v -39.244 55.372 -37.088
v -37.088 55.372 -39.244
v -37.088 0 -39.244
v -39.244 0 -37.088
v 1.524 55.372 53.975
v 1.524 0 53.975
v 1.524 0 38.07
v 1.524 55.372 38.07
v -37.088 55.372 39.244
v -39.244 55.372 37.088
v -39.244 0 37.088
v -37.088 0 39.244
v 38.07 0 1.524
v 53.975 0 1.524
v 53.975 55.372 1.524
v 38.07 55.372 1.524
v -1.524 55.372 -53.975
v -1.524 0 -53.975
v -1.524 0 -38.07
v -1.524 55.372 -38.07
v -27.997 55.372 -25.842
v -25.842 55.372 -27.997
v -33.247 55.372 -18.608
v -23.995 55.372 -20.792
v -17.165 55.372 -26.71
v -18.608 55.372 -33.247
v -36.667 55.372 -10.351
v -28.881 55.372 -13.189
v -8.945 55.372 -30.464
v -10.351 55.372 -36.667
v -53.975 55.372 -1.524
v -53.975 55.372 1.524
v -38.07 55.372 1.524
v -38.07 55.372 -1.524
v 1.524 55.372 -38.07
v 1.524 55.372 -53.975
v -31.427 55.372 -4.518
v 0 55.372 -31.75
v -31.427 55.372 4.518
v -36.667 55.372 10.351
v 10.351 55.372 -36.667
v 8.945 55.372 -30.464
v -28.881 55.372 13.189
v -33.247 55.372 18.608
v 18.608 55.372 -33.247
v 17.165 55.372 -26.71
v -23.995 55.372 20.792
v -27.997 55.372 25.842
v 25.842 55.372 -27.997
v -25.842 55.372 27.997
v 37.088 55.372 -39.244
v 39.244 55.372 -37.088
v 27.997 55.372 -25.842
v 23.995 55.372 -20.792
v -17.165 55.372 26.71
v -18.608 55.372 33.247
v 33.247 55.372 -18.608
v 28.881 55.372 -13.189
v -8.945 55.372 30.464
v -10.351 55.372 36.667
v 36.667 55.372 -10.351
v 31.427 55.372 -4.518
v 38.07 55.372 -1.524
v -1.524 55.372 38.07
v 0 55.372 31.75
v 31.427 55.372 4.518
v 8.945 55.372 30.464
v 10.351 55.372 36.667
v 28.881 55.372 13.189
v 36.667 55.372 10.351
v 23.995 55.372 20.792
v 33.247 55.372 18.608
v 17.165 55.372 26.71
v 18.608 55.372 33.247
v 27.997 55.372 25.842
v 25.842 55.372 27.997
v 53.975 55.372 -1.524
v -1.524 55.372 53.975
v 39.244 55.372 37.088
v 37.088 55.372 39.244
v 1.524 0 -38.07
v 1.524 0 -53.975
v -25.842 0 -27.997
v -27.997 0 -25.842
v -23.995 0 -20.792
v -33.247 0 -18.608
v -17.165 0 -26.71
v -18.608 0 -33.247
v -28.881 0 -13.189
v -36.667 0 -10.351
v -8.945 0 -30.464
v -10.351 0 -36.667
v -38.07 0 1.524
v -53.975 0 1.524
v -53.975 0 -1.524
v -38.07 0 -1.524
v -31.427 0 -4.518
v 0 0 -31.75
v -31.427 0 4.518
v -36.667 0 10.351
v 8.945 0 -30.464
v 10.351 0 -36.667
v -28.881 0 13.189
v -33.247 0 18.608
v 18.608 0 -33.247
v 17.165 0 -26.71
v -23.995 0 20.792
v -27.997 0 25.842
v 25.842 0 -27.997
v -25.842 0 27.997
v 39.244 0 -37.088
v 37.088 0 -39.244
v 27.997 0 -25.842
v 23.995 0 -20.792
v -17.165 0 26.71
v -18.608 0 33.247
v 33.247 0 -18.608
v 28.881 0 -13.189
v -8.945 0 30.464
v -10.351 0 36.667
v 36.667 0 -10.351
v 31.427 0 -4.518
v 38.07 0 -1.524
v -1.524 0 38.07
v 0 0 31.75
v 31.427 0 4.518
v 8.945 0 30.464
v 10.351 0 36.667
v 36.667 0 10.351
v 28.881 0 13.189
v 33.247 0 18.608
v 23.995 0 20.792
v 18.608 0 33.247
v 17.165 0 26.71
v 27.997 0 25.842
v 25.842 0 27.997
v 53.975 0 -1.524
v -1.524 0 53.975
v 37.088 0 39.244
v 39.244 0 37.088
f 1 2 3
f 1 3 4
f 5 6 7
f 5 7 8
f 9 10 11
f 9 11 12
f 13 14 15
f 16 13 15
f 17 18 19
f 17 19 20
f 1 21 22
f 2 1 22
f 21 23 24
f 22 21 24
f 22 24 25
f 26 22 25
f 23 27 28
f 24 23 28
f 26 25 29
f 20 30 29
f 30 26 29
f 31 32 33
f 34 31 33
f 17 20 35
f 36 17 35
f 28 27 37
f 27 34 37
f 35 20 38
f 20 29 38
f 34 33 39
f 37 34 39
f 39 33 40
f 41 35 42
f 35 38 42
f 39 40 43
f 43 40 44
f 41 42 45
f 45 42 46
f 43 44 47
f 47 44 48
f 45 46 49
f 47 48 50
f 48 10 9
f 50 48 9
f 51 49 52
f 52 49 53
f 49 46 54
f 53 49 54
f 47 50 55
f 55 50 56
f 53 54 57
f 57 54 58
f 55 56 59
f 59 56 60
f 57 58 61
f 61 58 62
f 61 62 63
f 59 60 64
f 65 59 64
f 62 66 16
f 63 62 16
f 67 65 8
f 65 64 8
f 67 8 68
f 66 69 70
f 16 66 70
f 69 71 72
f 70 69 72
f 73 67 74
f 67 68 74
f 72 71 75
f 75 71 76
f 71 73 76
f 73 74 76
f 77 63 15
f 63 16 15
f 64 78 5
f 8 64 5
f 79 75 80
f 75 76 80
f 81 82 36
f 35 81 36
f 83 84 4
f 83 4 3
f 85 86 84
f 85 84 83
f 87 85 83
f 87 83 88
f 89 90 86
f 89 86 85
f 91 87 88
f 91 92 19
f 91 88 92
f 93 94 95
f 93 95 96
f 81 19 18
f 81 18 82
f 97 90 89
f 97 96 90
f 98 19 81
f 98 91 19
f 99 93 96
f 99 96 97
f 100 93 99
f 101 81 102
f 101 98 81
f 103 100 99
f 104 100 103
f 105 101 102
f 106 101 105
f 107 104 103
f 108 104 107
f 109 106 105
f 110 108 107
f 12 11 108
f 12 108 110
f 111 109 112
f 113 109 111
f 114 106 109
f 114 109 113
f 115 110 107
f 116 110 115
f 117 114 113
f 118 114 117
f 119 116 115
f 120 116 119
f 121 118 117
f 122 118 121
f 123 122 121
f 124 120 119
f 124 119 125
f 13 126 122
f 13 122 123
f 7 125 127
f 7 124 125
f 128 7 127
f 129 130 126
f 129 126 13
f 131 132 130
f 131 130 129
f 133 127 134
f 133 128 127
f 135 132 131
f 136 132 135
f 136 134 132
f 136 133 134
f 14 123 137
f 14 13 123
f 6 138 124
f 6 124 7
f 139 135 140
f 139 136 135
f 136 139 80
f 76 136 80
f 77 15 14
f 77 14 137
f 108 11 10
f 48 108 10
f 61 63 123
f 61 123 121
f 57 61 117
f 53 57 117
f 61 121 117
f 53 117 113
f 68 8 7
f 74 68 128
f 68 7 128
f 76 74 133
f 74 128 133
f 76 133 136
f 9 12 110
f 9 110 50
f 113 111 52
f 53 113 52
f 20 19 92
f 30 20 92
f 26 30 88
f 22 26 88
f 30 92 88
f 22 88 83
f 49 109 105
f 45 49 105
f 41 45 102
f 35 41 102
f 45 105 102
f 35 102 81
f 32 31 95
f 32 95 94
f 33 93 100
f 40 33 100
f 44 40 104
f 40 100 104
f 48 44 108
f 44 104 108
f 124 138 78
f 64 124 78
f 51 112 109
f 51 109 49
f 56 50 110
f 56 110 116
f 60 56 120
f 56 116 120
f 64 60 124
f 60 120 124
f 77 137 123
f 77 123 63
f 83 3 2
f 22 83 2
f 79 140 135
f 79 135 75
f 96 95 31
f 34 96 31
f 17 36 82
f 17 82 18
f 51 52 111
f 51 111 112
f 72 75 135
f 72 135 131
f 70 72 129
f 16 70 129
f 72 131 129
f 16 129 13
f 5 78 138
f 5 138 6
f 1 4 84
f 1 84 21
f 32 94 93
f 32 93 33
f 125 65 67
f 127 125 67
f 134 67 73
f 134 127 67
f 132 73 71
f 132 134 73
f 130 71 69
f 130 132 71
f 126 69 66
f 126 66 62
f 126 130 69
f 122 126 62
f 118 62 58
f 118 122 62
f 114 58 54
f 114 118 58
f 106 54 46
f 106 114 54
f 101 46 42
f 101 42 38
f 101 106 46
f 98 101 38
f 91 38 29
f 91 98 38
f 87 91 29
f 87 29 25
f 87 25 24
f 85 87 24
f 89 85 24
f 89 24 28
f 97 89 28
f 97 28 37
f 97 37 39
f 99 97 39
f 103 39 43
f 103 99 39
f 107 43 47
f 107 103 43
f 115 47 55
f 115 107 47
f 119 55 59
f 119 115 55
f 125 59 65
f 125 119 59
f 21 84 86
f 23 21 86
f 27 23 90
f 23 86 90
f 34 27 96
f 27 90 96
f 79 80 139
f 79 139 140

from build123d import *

# Parameters (mm, degrees)
SKETCH1_R                = 38.1
SKETCH1_R_2              = 31.75
BOSS_EXTRUDE1_DEPTH      = 55.372
BOSS_EXTRUDE2_REACH      = 115.998
BOSS_EXTRUDE2_END_RADIUS = 38.1
SKETCH2_W                = 3.048
SKETCH2_H                = 55.372
CIRPATTERN1_COUNT        = 8


with BuildPart() as part:
    # Sketch1 → Boss-Extrude1 (new body)
    with BuildSketch(Plane(origin=(0, 0, 0), x_dir=(1, 0, 0), z_dir=(0, 1, 0))):
        with Locations(Location((0, 0, 0), (0, 0, 270))):
            Circle(SKETCH1_R)
        with Locations(Location((0, 0, 0), (0, 0, 270))):
            Circle(SKETCH1_R_2, mode=Mode.SUBTRACT)
    extrude(amount=BOSS_EXTRUDE1_DEPTH)

    # Boss-Extrude2: up to this cylinder (the profile starts outside it)
    boss_extrude2_end = Plane(origin=(0, 27.686, 0), z_dir=(0, -1, 0)) * Cylinder(BOSS_EXTRUDE2_END_RADIUS, 309.196, mode=Mode.PRIVATE)
    # Sketch2 → Boss-Extrude2 (add, up to the surface)
    with BuildSketch(Plane.XY.offset(53.975), mode=Mode.PRIVATE) as boss_extrude2_sk1:
        with Locations((0, 27.686)):
            Rectangle(SKETCH2_W, SKETCH2_H)
    boss_extrude2_tool1 = extrude(boss_extrude2_sk1.sketch, amount=-BOSS_EXTRUDE2_REACH, mode=Mode.PRIVATE) - boss_extrude2_end
    boss_extrude2 = boss_extrude2_tool1.solids().sort_by_distance((0, 27.686, 53.975))[0]
    add(boss_extrude2)

    # CirPattern1: Boss-Extrude2 ×8 about axis
    cirpattern1_axis = Axis((0, 0, 0), (0, 1, 0))
    for i in range(1, CIRPATTERN1_COUNT):
        add(boss_extrude2.rotate(cirpattern1_axis, i * 360 / CIRPATTERN1_COUNT))


solid = part.part
